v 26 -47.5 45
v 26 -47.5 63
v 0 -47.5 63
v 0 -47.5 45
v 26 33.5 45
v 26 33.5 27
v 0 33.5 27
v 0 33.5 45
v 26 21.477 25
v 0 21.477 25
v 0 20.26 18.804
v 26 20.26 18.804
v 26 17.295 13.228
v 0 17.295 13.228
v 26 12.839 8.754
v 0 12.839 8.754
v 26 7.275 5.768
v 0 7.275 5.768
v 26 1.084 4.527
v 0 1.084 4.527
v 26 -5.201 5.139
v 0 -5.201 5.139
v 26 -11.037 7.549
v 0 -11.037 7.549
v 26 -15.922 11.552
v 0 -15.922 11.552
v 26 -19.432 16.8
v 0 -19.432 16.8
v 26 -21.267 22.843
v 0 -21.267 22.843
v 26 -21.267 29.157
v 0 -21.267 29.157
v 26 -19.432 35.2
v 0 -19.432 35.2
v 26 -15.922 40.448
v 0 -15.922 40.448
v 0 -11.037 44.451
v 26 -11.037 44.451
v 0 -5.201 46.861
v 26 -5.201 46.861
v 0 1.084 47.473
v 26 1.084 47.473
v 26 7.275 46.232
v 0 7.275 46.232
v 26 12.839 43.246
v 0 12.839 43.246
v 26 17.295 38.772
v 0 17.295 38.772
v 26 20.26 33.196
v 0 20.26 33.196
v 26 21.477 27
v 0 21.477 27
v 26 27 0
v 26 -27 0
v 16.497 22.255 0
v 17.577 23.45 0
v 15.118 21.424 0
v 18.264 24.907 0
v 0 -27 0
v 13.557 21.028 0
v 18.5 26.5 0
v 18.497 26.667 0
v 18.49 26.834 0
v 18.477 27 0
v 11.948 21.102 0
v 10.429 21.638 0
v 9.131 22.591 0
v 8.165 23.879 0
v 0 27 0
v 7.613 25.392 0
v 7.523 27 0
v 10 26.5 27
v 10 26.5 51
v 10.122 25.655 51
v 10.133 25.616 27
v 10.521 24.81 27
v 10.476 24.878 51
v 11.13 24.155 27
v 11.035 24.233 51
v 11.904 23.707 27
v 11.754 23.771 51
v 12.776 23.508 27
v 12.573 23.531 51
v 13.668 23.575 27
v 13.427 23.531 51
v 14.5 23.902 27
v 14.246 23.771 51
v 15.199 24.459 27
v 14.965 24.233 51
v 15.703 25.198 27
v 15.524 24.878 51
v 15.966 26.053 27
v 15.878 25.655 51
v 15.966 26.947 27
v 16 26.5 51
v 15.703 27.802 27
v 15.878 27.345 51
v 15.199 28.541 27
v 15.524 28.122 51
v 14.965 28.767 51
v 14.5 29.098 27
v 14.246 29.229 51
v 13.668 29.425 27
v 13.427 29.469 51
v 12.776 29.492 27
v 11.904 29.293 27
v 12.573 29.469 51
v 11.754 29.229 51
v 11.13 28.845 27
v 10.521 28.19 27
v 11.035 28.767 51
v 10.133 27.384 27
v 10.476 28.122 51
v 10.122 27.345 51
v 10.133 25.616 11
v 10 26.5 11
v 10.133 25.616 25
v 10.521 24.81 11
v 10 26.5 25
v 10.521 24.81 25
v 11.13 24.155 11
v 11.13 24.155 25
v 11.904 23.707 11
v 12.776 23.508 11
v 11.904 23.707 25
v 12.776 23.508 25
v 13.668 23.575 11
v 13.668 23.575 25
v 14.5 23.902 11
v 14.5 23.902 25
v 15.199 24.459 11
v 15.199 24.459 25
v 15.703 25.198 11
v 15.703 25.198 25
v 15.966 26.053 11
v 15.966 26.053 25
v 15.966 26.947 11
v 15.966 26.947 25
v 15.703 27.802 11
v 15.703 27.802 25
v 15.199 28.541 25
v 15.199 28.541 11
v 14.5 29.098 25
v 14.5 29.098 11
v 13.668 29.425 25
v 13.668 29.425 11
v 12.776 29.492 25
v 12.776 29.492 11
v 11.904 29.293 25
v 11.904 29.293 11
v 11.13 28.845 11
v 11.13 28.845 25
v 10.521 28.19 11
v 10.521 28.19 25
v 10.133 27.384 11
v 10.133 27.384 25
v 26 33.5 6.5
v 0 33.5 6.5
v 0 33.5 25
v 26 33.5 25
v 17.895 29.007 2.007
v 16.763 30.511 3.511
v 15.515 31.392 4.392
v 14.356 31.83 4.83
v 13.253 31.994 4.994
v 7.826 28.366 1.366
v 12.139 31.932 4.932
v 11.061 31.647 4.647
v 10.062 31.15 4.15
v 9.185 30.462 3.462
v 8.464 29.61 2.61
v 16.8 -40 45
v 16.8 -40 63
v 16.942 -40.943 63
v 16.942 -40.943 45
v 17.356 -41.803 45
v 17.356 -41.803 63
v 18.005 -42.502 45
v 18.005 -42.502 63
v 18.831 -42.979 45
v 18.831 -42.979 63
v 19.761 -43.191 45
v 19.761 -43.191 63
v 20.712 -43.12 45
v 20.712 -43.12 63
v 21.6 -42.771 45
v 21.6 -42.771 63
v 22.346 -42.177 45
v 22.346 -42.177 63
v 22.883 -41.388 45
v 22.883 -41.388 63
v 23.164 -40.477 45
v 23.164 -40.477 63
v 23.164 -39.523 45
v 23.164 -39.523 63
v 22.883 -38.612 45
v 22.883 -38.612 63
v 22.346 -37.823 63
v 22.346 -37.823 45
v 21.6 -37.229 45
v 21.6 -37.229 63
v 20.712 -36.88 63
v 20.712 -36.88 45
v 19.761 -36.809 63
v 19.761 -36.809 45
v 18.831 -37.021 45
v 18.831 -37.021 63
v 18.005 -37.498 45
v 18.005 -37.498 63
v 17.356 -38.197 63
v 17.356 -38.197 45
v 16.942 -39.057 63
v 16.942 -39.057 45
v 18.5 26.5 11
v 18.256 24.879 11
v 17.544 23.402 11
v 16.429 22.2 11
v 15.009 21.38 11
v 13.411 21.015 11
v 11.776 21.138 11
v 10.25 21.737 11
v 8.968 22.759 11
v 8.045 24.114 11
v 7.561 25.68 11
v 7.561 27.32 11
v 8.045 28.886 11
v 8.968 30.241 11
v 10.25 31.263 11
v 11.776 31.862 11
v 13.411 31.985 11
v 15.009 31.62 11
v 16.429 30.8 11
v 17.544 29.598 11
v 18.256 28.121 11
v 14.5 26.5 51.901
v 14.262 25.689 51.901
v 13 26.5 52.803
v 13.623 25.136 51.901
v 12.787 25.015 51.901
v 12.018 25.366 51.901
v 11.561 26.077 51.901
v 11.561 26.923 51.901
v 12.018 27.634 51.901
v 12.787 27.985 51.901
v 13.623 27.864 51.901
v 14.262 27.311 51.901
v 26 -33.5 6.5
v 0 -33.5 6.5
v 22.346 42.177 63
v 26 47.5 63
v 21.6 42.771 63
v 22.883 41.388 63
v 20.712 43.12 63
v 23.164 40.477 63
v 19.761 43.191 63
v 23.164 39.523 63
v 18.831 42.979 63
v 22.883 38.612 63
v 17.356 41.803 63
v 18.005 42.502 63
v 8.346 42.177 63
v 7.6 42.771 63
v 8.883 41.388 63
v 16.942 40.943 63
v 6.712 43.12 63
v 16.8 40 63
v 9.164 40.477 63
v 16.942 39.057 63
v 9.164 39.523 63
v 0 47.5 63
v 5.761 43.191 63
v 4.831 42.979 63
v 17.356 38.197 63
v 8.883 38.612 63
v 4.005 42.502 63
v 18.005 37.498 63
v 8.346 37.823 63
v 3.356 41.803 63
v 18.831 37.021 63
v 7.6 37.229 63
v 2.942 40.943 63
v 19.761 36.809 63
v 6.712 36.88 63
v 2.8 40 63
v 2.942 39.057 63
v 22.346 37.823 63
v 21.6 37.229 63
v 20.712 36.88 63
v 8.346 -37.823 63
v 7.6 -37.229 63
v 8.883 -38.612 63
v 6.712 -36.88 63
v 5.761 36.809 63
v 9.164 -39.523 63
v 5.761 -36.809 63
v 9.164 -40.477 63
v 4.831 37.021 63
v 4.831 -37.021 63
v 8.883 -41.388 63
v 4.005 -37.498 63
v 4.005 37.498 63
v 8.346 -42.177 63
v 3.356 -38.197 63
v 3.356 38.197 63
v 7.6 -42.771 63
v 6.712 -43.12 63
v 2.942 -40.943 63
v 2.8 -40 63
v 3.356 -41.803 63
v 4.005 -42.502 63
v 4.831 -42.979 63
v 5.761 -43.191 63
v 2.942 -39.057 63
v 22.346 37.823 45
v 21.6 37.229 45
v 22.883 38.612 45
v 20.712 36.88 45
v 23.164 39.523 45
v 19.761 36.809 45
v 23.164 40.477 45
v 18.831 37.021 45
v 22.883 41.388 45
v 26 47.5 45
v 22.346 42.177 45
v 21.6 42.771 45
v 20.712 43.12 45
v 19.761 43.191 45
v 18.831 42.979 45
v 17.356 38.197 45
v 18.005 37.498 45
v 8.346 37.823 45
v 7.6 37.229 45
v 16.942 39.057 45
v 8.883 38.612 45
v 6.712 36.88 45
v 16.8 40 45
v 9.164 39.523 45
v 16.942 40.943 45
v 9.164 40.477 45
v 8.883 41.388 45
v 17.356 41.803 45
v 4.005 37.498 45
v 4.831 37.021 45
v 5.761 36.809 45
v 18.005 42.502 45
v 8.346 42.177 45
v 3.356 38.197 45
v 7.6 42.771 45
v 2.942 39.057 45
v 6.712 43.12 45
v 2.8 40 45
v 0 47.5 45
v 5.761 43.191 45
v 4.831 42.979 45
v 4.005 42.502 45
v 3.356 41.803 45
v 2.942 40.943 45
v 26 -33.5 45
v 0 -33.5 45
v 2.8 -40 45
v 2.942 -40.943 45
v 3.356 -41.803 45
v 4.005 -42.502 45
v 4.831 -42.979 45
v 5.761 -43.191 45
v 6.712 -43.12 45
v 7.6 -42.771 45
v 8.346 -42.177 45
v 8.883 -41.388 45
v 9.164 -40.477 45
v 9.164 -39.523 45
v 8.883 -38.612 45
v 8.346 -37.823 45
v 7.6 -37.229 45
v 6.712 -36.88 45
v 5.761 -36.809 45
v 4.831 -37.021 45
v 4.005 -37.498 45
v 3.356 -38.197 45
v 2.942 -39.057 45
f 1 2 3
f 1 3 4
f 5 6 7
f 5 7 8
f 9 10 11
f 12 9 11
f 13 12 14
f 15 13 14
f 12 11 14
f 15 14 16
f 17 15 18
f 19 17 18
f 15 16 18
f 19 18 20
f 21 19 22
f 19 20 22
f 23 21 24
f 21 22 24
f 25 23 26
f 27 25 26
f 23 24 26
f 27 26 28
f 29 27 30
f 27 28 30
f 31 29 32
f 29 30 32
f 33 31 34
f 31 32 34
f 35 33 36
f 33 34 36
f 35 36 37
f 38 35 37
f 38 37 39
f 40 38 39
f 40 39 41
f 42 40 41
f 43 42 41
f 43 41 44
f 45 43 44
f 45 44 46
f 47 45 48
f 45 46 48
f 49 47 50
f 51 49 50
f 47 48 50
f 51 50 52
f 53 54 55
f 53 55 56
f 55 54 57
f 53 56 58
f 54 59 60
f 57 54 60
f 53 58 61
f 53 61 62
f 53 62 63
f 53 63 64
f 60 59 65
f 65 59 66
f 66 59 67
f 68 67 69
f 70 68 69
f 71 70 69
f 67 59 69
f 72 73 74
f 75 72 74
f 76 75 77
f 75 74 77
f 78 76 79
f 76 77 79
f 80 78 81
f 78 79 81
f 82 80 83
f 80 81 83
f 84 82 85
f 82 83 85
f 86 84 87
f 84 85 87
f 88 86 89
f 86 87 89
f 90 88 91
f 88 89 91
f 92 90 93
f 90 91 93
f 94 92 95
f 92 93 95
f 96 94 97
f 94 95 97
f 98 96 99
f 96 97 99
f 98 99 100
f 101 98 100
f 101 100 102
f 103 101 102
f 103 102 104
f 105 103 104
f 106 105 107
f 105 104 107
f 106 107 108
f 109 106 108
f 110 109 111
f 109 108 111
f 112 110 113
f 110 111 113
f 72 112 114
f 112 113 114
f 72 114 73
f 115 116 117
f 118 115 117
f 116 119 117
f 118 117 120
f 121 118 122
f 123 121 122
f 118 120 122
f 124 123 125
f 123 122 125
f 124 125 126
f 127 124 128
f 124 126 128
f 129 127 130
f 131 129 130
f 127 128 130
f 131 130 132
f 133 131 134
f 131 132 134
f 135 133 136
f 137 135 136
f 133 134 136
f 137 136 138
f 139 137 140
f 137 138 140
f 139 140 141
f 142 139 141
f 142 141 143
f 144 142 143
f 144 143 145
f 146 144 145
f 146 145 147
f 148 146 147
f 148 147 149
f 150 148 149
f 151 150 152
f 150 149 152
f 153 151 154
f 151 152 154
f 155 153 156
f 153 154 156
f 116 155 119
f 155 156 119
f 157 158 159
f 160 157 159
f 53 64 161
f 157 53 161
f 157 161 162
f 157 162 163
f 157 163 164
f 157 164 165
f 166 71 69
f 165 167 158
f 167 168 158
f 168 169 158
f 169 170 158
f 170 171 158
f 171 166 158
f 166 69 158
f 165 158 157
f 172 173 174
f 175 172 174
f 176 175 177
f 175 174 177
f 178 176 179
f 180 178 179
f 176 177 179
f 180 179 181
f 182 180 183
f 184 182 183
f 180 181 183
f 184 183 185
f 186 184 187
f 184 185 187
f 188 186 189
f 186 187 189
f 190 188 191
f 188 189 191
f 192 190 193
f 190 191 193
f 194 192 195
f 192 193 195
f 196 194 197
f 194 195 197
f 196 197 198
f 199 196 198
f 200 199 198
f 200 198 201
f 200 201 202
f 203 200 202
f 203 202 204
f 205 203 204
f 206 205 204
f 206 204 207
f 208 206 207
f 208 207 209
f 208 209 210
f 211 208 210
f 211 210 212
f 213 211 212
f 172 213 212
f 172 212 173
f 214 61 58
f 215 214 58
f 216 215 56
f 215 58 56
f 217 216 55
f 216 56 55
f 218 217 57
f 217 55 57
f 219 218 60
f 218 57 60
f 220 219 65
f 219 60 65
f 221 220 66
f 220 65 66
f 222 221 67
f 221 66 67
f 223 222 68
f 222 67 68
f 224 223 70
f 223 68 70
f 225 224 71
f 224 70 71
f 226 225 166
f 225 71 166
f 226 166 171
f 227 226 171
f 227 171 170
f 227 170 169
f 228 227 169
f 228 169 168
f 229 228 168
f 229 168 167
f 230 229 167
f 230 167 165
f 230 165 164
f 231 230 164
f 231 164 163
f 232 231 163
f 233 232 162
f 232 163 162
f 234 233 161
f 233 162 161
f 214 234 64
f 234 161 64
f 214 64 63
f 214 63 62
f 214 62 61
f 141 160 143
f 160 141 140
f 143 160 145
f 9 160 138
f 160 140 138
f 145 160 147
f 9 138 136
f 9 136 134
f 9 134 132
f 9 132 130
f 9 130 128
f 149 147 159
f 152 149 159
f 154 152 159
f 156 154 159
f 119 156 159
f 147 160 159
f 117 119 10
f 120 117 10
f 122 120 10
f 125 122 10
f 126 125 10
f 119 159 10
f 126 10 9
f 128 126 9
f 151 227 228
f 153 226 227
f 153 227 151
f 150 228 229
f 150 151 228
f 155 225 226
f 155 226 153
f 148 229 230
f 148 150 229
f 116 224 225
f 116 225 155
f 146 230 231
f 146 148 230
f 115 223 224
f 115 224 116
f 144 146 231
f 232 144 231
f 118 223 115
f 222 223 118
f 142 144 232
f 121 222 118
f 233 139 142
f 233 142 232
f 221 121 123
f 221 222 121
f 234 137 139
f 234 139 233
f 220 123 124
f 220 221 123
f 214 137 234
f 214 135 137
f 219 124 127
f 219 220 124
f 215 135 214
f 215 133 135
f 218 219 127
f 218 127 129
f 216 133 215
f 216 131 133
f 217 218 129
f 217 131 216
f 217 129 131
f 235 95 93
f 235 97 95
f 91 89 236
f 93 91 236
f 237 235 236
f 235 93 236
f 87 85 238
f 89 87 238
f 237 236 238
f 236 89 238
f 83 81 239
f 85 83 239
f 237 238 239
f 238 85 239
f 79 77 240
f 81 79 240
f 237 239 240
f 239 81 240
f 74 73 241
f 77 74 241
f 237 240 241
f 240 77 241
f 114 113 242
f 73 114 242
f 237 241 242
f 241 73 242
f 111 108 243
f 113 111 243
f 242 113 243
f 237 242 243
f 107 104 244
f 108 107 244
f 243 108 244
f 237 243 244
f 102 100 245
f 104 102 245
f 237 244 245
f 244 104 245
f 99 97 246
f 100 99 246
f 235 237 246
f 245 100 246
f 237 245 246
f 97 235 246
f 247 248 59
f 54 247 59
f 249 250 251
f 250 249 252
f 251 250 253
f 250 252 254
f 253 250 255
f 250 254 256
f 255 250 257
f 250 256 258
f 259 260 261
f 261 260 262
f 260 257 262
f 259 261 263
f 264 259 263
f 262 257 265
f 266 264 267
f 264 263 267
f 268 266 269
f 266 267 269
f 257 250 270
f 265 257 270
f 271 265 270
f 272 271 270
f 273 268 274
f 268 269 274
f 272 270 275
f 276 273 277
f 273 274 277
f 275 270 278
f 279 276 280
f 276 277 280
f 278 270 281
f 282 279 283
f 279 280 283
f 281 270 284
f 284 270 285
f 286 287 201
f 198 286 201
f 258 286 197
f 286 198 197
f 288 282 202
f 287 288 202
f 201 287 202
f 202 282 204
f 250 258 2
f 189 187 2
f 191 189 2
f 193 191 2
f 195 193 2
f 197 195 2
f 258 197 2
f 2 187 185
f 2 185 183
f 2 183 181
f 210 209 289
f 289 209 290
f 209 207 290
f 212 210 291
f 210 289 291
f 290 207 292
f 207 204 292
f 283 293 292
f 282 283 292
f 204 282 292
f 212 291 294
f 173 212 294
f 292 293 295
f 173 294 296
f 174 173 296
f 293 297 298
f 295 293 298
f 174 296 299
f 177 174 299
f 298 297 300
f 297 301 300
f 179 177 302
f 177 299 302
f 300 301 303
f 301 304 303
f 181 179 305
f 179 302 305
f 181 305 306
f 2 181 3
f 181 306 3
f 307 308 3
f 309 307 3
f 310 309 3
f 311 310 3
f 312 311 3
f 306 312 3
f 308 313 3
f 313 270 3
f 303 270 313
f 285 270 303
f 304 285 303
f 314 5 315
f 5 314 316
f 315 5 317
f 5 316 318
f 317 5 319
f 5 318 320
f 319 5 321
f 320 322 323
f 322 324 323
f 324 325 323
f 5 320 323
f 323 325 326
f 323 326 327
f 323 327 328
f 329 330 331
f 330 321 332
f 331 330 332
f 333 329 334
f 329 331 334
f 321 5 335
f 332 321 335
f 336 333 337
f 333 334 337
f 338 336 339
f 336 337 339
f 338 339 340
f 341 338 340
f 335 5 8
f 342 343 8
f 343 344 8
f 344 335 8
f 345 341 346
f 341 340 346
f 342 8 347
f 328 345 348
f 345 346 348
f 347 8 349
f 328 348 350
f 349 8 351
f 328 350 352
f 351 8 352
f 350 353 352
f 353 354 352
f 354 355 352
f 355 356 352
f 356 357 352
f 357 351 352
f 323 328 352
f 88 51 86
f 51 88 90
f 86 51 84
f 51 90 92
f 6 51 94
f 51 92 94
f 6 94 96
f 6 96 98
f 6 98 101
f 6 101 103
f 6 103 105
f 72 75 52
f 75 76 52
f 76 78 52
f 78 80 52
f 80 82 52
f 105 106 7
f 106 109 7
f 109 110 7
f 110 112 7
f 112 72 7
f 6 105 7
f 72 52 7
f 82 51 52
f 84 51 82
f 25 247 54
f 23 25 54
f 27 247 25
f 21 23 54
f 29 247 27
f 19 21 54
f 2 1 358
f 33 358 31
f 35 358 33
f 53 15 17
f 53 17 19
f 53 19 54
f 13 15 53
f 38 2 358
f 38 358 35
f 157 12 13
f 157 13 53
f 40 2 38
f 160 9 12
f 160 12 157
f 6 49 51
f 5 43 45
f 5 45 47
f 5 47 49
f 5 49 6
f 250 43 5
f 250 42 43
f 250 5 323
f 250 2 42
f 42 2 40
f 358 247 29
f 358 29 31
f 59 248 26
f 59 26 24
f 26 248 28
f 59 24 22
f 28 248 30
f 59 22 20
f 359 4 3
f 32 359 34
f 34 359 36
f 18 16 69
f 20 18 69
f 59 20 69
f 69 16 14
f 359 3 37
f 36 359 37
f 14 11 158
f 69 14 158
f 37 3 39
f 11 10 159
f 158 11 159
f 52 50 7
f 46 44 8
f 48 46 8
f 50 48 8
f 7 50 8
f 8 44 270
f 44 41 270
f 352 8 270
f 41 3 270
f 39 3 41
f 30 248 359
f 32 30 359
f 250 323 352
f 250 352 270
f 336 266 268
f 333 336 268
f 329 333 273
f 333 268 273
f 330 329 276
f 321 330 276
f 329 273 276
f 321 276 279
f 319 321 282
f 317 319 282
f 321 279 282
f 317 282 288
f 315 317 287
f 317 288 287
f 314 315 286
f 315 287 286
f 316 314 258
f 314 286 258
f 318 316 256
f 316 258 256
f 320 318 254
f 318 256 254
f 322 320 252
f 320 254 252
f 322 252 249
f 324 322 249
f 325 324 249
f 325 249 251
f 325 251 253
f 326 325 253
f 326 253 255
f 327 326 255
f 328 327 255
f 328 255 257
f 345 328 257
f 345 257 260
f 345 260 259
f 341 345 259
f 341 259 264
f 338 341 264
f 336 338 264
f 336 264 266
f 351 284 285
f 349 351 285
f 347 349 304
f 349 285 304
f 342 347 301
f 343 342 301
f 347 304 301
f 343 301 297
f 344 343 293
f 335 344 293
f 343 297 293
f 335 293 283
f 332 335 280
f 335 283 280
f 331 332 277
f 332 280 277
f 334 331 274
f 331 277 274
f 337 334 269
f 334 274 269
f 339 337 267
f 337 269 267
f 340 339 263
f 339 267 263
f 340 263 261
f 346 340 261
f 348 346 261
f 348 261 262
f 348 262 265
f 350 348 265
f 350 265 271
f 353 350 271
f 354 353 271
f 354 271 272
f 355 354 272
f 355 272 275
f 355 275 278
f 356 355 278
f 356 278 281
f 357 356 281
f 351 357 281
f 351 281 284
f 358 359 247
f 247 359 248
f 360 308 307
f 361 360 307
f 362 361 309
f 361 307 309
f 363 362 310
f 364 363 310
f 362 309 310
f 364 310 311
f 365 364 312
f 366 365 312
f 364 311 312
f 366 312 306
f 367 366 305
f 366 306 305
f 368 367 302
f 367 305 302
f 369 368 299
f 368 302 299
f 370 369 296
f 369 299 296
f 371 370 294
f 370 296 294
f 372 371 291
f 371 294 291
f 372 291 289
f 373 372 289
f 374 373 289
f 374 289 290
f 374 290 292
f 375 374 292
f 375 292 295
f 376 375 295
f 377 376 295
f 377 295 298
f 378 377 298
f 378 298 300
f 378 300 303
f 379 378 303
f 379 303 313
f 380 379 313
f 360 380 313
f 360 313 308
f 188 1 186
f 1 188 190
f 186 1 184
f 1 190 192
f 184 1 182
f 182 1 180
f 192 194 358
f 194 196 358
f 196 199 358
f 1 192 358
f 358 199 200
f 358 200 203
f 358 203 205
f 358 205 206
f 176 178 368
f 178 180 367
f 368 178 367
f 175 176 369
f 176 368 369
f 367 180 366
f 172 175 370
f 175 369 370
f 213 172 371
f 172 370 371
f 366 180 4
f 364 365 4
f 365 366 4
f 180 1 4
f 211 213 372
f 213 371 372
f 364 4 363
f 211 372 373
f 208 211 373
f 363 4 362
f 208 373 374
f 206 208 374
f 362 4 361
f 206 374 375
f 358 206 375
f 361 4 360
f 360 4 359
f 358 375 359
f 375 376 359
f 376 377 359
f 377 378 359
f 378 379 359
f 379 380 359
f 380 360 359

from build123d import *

# Parameters (mm, degrees)
F1_DEPTH       = 26
F3_D           = 6.4
F5_D           = 6
F5_DEPTH       = 46
F5_START       = 5
F5_CBORE_D     = 11
F5_CBORE_DEPTH = 6
F5_TIP         = 1.8025818571


with BuildPart() as f1:
    # F0 (on Right) → F1 (new body)
    with BuildSketch(Plane.YZ):
        with BuildLine():
            Line((-33.5, 6.5), (-27, 0))
            Line((-27, 0), (27, 0))
            Line((27, 0), (33.5, 6.5))
            Line((33.5, 6.5), (33.5, 25))
            Line((33.5, 25), (21.4767315949, 25))
            ThreePointArc((21.4767315949, 25), (-21.5, 26), (21.4767315949, 27))
            Line((21.4767315949, 27), (33.5, 27))
            Line((33.5, 27), (33.5, 45))
            Line((33.5, 45), (47.5, 45))
            Line((47.5, 45), (47.5, 63))
            Line((47.5, 63), (-47.5, 63))
            Line((-47.5, 63), (-47.5, 45))
            Line((-47.5, 45), (-33.5, 45))
            Line((-33.5, 45), (-33.5, 6.5))
        make_face()
    extrude(amount=F1_DEPTH)

    # F3 (through all)
    with Locations(Plane(origin=(0, 0, 45), x_dir=(1, 0, 0), z_dir=(0, 0, -1))):
        with Locations((6, 40), (20, 40), (20, -40), (6, -40)):
            Hole(F3_D / 2)

    # F5
    # its depths count from where the whole tool has entered the part; down to there all is cleared
    with Locations(Plane(origin=(0, 0, 0), x_dir=(1, 0, 0), z_dir=(0, 0, -1)).offset(-F5_START)):
        with Locations((13, -26.5)):
            CounterBoreHole(F5_D / 2, F5_CBORE_D / 2, F5_CBORE_DEPTH, depth=F5_DEPTH)
            with Locations((0, 0, -(F5_DEPTH + F5_TIP / 2))):  # 118° drill point
                Cone(0, F5_D / 2, F5_TIP, mode=Mode.SUBTRACT)


solid = f1.part
